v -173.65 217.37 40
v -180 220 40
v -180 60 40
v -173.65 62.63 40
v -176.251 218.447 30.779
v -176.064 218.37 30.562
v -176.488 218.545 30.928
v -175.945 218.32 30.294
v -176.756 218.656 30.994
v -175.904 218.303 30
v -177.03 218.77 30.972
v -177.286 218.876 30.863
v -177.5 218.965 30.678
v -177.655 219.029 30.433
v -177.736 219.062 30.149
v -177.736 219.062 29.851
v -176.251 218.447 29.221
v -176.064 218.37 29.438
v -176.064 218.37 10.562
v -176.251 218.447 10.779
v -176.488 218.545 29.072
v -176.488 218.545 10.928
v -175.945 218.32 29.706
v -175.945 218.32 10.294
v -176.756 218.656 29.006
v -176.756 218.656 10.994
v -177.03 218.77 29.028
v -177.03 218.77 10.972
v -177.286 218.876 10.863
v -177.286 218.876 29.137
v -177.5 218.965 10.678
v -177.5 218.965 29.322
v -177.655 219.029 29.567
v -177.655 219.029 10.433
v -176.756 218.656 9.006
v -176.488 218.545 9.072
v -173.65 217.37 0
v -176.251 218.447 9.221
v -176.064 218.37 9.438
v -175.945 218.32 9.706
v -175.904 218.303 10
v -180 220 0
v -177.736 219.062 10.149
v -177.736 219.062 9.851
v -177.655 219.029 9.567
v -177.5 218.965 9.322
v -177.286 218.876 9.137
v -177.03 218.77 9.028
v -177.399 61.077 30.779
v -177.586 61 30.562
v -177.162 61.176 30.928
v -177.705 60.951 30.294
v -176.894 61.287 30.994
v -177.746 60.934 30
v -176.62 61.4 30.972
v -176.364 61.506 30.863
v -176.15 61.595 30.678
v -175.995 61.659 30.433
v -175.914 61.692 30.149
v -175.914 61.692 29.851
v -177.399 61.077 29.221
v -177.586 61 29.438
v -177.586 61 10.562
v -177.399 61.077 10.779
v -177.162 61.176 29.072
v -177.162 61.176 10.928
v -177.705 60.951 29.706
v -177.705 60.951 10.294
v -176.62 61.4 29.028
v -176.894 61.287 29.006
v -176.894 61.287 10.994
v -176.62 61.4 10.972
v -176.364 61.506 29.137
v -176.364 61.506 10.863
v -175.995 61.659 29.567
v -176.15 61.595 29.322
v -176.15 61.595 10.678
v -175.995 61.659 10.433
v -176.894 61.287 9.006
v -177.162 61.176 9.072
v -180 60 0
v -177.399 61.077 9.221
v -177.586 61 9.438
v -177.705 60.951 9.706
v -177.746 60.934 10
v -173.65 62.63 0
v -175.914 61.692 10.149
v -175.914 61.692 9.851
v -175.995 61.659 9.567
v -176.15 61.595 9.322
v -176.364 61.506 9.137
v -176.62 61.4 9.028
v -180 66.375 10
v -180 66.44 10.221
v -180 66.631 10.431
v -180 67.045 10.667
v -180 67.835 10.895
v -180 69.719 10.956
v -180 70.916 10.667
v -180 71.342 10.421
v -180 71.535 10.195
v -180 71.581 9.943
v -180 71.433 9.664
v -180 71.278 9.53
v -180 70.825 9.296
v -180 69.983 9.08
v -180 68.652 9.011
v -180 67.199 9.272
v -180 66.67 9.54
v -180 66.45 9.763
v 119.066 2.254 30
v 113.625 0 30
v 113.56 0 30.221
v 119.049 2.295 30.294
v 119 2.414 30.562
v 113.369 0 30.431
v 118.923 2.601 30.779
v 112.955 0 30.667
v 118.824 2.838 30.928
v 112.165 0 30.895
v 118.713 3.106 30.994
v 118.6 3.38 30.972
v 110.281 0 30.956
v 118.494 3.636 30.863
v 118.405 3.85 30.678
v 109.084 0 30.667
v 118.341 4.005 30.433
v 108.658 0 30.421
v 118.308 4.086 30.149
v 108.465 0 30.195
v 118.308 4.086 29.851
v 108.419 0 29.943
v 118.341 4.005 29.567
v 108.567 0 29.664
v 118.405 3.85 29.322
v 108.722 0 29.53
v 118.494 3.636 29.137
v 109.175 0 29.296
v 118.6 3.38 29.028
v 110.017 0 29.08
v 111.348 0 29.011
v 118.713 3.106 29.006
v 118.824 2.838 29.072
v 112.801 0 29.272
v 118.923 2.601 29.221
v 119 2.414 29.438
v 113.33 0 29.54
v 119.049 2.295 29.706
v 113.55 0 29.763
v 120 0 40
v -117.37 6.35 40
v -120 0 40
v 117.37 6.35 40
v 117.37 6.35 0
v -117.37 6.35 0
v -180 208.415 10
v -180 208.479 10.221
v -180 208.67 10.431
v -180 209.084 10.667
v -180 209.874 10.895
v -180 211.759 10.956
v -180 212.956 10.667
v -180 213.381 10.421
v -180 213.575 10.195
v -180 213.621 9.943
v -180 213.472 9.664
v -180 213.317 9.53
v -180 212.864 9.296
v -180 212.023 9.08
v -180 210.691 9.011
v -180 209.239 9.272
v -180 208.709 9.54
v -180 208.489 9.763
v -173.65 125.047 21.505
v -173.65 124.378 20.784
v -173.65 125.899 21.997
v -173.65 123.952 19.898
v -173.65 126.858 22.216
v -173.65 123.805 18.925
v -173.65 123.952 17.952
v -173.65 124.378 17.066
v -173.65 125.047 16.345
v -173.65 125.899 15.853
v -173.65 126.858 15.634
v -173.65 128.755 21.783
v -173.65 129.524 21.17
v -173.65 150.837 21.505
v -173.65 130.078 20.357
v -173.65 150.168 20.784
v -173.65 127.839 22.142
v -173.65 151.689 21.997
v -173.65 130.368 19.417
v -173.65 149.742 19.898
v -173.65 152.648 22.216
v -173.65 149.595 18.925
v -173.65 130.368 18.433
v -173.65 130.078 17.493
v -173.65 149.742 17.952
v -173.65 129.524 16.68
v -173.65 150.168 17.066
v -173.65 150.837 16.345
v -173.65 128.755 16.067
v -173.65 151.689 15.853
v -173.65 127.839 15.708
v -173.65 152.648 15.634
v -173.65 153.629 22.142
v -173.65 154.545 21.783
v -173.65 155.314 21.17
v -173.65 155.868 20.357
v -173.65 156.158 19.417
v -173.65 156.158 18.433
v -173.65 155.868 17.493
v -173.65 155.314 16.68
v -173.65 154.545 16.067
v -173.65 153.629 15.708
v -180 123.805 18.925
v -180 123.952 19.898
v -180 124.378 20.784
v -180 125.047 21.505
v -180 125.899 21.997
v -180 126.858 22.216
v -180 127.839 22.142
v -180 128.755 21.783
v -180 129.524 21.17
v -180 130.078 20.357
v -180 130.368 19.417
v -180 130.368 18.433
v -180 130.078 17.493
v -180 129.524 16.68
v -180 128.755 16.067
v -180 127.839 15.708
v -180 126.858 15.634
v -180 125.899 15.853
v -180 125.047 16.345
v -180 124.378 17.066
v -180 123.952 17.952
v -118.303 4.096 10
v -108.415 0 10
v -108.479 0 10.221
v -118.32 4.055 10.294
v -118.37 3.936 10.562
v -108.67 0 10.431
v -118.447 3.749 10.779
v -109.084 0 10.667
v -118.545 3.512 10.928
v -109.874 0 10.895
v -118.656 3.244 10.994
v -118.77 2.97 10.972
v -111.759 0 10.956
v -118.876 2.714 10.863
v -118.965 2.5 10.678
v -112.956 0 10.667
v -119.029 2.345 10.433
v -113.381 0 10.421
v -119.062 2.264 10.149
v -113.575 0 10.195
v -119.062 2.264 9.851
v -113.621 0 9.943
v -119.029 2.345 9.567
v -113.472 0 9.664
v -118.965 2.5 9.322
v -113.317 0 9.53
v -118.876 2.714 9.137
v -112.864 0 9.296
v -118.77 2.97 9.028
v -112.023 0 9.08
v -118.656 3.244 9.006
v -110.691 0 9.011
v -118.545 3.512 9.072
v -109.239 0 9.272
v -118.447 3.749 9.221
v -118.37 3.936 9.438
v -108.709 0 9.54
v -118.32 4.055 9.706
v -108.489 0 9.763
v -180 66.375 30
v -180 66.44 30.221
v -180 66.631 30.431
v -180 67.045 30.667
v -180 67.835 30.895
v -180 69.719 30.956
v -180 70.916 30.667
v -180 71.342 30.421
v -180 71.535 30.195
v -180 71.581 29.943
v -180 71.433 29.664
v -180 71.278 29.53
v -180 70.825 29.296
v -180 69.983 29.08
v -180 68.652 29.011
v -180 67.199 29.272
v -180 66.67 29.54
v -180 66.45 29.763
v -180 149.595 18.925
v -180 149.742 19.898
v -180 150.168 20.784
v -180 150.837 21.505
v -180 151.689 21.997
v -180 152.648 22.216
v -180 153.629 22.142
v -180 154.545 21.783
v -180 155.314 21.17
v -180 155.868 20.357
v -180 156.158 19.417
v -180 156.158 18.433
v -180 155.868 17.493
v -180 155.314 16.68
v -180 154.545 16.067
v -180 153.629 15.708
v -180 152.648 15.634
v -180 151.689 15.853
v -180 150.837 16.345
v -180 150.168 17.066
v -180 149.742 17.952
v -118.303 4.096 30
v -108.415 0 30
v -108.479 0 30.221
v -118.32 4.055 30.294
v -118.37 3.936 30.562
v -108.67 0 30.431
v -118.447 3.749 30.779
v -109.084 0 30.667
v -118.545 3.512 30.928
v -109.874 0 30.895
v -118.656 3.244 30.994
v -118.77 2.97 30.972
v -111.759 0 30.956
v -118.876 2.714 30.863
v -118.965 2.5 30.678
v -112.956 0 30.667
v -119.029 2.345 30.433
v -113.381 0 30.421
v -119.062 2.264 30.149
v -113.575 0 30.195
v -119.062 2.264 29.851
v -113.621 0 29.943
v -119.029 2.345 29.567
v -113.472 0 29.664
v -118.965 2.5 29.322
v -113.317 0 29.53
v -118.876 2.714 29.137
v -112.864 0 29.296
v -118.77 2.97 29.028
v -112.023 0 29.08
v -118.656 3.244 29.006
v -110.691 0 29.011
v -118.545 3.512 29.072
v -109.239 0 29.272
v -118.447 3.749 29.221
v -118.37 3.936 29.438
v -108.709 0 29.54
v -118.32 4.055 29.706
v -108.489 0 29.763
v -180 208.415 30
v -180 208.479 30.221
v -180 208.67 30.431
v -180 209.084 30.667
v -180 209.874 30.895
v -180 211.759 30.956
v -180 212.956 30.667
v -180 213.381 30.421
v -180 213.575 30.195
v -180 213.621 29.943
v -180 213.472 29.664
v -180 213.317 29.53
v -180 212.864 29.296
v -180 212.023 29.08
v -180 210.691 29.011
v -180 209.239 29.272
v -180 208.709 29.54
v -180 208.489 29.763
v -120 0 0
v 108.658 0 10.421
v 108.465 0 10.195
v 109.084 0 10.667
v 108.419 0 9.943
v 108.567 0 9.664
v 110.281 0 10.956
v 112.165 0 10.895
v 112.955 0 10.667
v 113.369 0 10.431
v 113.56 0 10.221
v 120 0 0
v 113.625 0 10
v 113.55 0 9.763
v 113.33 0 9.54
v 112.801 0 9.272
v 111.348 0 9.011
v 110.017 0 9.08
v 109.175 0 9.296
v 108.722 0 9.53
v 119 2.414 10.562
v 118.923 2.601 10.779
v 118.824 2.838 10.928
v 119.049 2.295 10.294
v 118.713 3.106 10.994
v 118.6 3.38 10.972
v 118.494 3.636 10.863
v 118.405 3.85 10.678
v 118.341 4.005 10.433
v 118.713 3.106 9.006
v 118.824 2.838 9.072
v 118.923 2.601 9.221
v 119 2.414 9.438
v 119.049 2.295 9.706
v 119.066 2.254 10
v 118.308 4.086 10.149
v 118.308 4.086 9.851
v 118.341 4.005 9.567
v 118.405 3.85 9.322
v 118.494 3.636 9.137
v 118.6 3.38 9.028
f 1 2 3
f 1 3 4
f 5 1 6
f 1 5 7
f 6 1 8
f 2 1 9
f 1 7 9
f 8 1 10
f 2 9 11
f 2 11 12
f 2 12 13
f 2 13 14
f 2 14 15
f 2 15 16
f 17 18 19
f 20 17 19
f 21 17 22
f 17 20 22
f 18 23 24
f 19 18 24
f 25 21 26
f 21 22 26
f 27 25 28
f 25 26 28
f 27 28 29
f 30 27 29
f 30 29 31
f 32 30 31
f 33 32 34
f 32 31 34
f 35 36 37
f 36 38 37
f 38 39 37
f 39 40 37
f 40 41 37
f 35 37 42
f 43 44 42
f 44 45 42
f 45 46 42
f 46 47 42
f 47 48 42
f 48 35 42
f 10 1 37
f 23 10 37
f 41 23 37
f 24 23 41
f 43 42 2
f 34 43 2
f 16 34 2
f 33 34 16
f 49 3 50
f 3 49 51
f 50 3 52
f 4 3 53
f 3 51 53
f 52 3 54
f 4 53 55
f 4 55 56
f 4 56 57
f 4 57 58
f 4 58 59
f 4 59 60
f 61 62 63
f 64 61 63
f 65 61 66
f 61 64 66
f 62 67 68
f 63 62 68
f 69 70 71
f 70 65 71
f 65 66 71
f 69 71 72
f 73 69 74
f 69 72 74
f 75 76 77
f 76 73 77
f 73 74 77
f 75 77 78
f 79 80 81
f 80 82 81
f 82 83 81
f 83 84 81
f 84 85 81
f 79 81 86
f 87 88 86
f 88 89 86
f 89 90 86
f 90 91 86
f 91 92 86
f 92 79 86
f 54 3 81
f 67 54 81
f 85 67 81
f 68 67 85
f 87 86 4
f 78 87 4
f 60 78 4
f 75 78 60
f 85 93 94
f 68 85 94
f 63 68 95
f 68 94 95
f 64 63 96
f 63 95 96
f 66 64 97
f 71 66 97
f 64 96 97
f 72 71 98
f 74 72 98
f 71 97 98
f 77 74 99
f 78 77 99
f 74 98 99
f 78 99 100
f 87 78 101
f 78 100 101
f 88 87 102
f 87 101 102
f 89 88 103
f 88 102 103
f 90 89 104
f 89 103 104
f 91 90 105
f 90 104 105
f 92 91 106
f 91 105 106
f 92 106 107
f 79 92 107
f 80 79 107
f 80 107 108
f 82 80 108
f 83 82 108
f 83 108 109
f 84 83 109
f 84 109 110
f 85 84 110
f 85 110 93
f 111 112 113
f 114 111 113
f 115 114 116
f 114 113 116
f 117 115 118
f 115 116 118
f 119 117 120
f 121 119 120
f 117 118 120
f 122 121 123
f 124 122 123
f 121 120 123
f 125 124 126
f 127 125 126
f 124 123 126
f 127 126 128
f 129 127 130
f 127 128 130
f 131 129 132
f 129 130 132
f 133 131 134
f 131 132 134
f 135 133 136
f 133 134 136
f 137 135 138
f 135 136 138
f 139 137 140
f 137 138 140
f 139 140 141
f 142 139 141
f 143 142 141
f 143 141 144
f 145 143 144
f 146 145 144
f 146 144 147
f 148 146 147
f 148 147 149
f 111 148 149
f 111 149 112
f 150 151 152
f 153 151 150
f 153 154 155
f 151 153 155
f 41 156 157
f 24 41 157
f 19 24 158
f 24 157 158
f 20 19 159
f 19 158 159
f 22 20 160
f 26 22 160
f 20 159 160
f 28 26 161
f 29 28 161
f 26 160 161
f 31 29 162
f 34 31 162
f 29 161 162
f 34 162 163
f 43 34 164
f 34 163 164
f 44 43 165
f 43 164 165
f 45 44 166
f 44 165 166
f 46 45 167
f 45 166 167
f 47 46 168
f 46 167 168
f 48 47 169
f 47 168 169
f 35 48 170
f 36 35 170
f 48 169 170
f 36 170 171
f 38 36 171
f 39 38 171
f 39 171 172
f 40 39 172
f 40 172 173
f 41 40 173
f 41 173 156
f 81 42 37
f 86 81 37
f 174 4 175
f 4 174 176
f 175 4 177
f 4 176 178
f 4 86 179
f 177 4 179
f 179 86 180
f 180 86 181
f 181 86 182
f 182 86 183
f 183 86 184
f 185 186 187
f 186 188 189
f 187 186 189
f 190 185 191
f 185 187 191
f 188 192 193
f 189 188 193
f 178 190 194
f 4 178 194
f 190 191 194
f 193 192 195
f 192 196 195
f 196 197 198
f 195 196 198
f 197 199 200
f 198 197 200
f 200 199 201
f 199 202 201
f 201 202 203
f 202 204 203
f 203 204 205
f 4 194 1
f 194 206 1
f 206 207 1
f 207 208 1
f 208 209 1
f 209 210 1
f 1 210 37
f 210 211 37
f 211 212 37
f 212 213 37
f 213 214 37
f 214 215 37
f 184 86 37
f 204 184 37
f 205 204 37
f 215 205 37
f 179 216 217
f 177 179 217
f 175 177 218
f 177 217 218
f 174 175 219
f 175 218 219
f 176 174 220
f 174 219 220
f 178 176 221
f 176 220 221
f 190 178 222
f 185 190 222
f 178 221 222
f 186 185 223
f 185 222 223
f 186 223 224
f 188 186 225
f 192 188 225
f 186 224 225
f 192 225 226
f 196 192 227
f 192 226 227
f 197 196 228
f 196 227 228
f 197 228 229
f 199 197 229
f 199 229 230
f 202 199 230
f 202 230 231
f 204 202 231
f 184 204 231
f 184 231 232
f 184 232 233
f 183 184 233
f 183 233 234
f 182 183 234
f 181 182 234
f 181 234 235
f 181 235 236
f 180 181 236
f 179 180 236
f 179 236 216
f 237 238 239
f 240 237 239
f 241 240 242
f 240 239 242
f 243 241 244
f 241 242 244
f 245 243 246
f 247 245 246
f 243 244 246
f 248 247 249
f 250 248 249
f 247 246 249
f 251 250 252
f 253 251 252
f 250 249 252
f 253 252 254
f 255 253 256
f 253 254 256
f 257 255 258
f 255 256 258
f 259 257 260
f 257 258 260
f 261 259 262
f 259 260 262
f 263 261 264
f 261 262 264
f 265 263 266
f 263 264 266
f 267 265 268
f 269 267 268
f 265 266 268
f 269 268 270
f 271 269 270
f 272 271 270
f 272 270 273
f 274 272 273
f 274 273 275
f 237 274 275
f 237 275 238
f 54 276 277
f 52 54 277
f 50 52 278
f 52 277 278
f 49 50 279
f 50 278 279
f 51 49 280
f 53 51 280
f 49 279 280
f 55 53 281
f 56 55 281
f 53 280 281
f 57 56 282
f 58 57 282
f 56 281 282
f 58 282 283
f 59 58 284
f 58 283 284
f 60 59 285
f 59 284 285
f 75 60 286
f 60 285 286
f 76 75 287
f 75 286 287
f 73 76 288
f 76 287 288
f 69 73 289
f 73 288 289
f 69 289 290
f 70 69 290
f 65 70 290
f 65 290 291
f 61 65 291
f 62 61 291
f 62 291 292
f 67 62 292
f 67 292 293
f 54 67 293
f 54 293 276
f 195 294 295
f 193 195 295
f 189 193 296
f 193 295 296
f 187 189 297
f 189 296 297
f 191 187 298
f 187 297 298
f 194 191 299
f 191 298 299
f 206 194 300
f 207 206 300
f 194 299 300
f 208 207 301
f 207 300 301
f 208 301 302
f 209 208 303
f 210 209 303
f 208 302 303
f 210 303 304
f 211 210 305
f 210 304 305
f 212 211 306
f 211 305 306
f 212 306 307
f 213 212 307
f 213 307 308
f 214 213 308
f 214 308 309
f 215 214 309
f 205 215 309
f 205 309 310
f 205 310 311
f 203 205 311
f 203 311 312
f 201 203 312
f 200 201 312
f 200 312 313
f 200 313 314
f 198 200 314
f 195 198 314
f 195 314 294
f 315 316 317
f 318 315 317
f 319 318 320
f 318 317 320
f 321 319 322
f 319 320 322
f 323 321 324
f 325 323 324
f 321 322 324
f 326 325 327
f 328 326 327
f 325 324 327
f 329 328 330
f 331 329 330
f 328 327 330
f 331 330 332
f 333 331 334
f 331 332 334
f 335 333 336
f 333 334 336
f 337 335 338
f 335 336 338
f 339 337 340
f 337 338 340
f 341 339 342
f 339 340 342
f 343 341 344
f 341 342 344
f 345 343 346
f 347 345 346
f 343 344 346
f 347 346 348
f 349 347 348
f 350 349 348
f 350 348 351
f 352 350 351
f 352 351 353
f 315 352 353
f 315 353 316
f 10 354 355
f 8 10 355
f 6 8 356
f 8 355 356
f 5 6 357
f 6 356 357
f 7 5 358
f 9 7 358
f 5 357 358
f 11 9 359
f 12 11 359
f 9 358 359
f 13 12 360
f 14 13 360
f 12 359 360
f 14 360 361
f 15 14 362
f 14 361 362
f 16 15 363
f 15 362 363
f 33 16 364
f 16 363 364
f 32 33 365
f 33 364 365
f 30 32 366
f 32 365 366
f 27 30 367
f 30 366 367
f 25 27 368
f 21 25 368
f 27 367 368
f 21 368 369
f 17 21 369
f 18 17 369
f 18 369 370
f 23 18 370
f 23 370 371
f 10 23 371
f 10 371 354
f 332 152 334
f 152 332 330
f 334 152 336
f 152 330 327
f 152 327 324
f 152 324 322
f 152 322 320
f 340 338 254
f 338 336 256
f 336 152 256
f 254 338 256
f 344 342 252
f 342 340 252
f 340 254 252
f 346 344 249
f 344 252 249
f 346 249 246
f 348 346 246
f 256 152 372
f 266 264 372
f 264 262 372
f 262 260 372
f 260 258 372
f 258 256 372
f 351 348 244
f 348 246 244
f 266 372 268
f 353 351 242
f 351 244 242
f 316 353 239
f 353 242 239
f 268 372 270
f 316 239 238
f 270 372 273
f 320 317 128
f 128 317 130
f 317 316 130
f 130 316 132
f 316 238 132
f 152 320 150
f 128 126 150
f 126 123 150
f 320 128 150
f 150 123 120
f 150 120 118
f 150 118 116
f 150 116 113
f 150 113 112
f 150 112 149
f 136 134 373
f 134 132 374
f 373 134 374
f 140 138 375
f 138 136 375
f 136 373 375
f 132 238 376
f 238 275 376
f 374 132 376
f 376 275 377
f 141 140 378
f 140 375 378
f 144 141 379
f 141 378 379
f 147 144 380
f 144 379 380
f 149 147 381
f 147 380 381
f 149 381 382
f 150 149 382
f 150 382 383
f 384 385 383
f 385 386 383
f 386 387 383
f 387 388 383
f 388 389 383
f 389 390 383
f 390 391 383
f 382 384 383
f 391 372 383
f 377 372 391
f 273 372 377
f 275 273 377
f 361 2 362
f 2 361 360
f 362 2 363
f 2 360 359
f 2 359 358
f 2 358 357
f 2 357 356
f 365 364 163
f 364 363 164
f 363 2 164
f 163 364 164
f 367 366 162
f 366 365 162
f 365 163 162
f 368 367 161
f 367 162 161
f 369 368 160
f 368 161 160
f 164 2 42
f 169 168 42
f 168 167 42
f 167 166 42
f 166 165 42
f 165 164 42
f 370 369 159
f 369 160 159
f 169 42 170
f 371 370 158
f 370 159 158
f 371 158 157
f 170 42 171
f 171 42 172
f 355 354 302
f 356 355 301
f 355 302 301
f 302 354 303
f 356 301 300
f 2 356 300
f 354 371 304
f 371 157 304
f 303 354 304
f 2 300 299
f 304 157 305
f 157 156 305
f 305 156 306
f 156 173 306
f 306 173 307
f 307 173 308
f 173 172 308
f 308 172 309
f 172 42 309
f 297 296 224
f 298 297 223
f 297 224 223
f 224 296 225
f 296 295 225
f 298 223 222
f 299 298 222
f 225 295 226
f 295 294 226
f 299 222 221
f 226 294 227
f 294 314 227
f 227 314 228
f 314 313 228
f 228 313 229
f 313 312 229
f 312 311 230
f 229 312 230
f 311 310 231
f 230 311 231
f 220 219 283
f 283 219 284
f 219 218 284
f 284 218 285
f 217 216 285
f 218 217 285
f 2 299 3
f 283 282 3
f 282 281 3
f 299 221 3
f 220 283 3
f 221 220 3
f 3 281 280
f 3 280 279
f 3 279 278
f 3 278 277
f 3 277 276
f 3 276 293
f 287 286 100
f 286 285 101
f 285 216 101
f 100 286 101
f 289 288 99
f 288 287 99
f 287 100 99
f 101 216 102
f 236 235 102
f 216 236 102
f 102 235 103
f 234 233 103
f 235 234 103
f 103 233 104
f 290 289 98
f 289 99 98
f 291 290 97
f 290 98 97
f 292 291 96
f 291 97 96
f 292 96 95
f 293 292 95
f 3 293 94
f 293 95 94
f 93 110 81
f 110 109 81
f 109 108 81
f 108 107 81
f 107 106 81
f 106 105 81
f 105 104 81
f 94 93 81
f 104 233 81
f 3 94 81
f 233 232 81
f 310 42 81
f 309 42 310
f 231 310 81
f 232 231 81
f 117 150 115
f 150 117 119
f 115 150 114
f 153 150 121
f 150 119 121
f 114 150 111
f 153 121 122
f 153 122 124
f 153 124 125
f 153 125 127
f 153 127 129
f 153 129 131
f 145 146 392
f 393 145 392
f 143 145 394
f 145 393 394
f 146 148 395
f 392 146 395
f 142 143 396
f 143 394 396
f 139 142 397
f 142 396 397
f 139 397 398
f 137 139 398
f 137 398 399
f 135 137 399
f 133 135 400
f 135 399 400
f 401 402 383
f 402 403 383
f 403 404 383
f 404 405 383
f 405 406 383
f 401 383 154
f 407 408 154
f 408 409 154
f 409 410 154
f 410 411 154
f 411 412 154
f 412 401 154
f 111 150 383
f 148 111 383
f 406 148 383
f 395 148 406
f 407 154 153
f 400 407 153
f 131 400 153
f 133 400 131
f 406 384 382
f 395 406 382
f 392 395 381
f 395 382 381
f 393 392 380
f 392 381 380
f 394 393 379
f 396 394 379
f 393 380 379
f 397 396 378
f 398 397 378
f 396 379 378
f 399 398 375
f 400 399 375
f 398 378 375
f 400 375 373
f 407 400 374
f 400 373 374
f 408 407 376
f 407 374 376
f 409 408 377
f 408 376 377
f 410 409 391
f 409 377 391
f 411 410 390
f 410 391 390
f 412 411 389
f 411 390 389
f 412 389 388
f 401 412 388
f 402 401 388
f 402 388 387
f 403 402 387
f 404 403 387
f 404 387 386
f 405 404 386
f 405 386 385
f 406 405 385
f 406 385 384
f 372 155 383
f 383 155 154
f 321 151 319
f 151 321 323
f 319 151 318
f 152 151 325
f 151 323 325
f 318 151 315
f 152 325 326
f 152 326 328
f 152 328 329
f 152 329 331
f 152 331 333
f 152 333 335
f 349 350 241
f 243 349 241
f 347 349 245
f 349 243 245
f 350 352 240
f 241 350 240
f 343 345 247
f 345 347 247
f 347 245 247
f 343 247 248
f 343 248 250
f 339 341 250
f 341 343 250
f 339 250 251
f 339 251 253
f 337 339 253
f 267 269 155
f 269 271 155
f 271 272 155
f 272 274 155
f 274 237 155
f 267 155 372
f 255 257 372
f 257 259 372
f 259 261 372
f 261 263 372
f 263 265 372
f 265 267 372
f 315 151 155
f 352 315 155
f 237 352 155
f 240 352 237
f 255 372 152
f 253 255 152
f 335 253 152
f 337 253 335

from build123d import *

# Parameters (mm, degrees)
F1_DEPTH     = 40
F2_DEPTH     = 40
F3_DEPTH     = 40
F4_DEPTH     = 40
F6_D         = 6.6
F8_D         = 6.6
F14_D        = 1.9939
F14_ON_F13_D = 1.9939
F14_ON_F10_D = 1.9939
F14_ON_F11_D = 1.9939


with BuildPart() as f1:
    # F0 (on Top) → F1 (new body)
    with BuildSketch(Plane.XY):
        Polygon((120, 280), (-120, 280), (-117.3697438789, 273.65), (117.3697438789, 273.65), align=None)
    extrude(amount=F1_DEPTH)


with BuildPart() as f2:
    # F0 (on Top) → F2 (new body)
    with BuildSketch(Plane.XY):
        Polygon((-180, 220), (-180, 60), (-173.65, 62.6302561211), (-173.65, 217.3697438789), align=None)
    extrude(amount=F2_DEPTH)

    # F6 (through all)
    with Locations(Plane.YZ.offset(-173.65)):
        with Locations((127.105, 18.925), (152.895, 18.925)):
            Hole(F6_D / 2)

    # F14 on F10 (through all)
    with Locations(Plane(origin=(-47.5735931288, 114.8528137424, 0), x_dir=(0.9238795325, 0.3826834324, 0), z_dir=(0.3826834324, -0.9238795325, 0))):
        with Locations((-139.9007146742, 30), (-139.9007146742, 10)):
            Hole(F14_ON_F10_D / 2)

    # F14 on F11 (through all)
    with Locations(Plane(origin=(51.4213562373, 124.1421356237, 0), x_dir=(-0.9238795325, 0.3826834324, 0), z_dir=(0.3826834324, 0.9238795325, 0))):
        with Locations((247.0520757364, 30), (247.0520757364, 10)):
            Hole(F14_ON_F11_D / 2)


with BuildPart() as f3:
    # F0 (on Top) → F3 (new body)
    with BuildSketch(Plane.XY):
        Polygon((173.65, 62.6302561211), (180, 60), (180, 220), (173.65, 217.3697438789), align=None)
    extrude(amount=F3_DEPTH)

    # F8 (through all)
    with Locations(Plane(origin=(173.65, 0, 0), x_dir=(0, -1, 0), z_dir=(-1, 0, 0))):
        with Locations((-127.105, 20), (-152.895, 20)):
            Hole(F8_D / 2)


with BuildPart() as f4:
    # F0 (on Top) → F4 (new body)
    with BuildSketch(Plane.XY):
        Polygon((-117.3697438789, 6.35), (-120, 0), (120, 0), (117.3697438789, 6.35), align=None)
    extrude(amount=F4_DEPTH)

    # F14 (through all)
    with Locations(Plane(origin=(102.4264068712, 42.4264068712, 0), x_dir=(-0.3826834324, 0.9238795325, 0), z_dir=(0.9238795325, 0.3826834324, 0))):
        with Locations((-42.4854166479, 30), (-42.4854166479, 10)):
            Hole(F14_D / 2)

    # F14 on F13 (through all)
    with Locations(Plane(origin=(-102.4264068712, 42.4264068712, 0), x_dir=(-0.3826834324, -0.9238795325, 0), z_dir=(-0.9238795325, 0.3826834324, 0))):
        with Locations((42.4854166479, 30), (42.4854166479, 10)):
            Hole(F14_ON_F13_D / 2)


solid = Compound([f2.part, f4.part])
